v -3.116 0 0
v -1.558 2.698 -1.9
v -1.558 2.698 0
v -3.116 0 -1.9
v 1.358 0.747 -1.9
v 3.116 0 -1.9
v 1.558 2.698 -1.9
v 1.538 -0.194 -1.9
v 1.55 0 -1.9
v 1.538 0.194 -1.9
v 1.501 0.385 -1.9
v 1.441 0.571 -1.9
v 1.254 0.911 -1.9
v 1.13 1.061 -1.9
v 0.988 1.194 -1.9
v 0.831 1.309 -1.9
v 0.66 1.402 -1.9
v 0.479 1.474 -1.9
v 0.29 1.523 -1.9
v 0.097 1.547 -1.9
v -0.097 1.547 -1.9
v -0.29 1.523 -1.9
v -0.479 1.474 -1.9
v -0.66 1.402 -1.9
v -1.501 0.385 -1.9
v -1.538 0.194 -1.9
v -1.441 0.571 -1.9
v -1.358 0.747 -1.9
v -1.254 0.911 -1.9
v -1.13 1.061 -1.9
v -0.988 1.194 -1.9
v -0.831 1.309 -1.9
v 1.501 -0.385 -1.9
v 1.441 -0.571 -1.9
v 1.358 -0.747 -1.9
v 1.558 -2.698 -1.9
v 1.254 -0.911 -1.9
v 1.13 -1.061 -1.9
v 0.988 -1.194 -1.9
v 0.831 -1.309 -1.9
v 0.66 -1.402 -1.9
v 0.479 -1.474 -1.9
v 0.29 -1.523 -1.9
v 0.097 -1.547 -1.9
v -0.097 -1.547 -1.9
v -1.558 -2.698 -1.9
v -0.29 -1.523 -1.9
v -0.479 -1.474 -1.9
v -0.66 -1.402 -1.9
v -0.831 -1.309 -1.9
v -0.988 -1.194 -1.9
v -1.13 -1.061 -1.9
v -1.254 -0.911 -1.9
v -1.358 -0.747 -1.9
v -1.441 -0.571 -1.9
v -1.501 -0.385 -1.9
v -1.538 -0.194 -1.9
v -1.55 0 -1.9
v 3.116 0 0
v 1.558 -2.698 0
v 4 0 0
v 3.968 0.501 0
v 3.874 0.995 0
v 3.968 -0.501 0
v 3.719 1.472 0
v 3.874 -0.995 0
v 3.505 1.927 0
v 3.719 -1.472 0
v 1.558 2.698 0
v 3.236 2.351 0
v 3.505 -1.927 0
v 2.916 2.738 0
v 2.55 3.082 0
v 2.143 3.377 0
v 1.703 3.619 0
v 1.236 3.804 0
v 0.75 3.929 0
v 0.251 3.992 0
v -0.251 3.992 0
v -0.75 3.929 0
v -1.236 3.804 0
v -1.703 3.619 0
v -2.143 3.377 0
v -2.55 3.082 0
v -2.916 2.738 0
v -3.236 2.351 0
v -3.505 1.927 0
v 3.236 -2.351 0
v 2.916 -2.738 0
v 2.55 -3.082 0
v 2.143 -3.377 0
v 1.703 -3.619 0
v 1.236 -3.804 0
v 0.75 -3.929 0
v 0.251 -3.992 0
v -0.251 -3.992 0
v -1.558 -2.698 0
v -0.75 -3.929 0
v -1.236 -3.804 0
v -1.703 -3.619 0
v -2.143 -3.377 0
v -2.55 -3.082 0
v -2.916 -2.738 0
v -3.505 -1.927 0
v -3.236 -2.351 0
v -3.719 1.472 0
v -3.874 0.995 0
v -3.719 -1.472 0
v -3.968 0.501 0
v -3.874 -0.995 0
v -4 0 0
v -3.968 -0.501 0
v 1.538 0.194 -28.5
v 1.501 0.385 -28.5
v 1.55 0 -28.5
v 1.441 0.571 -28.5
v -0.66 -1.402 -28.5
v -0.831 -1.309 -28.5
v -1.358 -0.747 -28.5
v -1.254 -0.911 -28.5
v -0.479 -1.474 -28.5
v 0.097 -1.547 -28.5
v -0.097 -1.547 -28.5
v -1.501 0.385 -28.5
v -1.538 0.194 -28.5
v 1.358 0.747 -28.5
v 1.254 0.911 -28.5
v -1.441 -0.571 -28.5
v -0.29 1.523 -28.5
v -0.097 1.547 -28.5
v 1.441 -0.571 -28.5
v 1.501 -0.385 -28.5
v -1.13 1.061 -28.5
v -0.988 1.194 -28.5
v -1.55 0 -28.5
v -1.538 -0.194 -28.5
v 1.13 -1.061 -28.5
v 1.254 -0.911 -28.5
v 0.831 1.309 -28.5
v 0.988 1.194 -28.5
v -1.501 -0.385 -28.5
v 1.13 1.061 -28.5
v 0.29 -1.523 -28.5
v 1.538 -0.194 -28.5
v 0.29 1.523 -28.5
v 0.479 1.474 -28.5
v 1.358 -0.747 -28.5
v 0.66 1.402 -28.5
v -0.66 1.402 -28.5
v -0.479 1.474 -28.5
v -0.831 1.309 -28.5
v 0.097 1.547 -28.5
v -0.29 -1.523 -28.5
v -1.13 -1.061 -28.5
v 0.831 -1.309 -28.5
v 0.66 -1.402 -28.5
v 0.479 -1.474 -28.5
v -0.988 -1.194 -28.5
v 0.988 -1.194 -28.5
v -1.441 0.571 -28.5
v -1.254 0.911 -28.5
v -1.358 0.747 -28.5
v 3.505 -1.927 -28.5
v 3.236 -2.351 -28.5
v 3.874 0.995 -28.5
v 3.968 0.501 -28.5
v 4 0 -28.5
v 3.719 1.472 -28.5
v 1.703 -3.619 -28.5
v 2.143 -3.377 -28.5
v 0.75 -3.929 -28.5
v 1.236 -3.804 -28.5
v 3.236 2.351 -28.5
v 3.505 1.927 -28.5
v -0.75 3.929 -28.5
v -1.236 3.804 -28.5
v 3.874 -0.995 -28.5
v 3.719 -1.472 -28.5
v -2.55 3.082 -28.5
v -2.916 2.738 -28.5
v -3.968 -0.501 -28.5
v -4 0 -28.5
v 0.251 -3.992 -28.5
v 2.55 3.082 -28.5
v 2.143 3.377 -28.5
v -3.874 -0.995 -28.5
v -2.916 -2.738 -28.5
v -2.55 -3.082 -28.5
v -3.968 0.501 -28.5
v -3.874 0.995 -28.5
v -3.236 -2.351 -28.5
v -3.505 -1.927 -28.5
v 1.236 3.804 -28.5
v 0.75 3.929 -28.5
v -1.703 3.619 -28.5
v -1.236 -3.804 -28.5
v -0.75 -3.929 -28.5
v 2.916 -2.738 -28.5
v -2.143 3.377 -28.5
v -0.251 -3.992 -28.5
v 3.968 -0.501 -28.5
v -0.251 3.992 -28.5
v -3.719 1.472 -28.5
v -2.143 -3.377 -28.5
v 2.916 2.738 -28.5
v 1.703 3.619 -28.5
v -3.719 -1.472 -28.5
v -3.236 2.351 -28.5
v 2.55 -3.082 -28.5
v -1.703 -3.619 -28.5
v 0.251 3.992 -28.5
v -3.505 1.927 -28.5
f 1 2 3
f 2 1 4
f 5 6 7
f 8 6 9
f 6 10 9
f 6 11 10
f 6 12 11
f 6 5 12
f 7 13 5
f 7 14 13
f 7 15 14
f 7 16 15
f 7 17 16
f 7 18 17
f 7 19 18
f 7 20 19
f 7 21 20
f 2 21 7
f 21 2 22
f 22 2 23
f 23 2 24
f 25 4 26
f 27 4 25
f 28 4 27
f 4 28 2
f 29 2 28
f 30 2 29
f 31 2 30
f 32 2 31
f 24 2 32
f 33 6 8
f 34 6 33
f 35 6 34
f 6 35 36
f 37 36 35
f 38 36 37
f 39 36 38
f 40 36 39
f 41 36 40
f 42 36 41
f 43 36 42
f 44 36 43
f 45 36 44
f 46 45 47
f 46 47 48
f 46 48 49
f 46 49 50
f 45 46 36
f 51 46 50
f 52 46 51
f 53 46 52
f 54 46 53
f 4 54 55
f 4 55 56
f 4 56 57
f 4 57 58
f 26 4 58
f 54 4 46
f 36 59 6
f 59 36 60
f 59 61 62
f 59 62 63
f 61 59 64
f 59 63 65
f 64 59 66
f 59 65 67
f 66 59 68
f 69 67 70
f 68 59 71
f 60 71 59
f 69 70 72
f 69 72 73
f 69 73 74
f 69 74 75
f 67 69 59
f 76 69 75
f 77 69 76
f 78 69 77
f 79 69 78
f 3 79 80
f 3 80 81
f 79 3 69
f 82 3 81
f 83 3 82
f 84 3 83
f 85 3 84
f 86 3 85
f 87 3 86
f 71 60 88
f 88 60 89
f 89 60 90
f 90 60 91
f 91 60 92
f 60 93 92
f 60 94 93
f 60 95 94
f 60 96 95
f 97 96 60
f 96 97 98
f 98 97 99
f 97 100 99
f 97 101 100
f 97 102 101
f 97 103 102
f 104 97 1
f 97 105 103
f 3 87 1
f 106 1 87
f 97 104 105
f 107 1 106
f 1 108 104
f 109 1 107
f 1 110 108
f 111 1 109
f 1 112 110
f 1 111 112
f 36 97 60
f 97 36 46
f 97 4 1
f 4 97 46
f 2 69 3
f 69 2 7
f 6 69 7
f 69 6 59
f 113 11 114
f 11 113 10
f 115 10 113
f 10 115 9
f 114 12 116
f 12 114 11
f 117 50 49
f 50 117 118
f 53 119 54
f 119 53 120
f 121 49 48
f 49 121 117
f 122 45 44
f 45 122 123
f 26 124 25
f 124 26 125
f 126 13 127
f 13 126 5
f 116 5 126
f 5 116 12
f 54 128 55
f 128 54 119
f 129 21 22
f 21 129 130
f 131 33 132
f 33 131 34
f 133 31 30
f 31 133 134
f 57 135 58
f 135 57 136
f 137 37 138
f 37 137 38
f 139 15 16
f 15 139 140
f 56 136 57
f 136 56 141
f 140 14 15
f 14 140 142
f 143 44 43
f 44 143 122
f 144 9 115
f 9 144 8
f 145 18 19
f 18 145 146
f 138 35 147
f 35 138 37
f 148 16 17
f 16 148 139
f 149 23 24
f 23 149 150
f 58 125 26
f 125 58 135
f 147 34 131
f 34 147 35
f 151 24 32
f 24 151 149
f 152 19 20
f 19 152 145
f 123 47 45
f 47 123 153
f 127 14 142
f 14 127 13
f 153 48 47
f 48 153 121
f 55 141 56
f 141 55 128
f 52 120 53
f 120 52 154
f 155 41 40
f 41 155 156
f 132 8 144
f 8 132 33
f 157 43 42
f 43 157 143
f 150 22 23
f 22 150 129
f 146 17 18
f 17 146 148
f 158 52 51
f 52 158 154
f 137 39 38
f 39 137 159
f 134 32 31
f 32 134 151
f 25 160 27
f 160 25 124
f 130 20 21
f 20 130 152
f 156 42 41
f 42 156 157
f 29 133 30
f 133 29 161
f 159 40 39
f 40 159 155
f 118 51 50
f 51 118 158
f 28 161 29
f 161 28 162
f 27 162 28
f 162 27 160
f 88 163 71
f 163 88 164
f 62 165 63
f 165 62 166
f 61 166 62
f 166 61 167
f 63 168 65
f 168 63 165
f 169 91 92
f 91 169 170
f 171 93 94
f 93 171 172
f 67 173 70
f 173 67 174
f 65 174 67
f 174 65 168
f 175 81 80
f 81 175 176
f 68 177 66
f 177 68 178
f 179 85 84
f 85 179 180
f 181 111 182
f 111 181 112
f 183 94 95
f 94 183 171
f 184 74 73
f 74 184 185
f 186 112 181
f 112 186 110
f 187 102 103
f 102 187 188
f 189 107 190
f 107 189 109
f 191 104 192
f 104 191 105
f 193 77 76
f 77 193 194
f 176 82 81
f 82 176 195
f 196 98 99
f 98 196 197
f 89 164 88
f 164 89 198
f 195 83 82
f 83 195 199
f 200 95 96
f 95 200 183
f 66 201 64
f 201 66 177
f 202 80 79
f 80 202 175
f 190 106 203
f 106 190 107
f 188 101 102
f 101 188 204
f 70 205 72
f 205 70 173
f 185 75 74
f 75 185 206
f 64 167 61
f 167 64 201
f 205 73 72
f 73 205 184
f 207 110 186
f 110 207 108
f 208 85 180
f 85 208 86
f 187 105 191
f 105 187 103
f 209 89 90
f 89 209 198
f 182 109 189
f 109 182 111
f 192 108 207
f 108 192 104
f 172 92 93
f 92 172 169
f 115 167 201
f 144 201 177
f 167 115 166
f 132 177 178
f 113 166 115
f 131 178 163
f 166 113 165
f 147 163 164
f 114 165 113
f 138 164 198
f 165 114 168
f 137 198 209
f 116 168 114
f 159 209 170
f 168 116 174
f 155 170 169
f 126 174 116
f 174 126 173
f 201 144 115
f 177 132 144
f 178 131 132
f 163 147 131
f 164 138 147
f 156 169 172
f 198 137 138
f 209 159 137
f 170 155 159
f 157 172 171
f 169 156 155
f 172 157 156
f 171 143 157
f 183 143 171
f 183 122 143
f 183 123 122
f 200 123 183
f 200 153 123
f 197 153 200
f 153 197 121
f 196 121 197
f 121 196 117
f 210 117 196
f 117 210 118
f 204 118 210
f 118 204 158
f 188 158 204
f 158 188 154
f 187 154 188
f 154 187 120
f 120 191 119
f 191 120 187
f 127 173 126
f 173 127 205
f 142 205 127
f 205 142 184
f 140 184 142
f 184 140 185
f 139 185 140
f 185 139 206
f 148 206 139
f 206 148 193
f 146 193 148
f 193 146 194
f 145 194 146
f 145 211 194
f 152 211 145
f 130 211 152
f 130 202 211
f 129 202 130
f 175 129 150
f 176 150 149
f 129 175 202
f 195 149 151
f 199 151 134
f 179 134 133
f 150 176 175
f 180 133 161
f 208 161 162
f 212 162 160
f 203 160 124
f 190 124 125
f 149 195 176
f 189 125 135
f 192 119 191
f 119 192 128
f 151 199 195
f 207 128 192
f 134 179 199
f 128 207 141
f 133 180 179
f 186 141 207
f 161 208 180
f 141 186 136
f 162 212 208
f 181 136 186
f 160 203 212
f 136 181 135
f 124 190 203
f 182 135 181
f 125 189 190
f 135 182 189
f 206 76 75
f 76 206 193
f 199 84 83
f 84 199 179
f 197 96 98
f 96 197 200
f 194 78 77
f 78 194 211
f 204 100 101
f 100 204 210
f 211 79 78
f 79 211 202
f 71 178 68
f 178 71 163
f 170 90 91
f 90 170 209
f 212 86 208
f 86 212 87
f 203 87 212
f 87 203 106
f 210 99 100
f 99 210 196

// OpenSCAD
$fn = 50;

difference() {
	union() {
		translate(v = [0, 0, -28.5]) {
			cylinder(h = 31.5, r = 4.0);
		}
	}
	union() {
		translate(v = [0, 0, 0]) {
			rotate(a = [0, 0, 0]) {
				difference() {
					union() {
						translate(v = [0, 0, -1.9]) {
							linear_extrude(height = 1.9) {
								polygon(points = [[3.1158, 0.0], [1.5579000000000005, 2.698361953111554], [-1.5578999999999994, 2.6983619531115544], [-3.1158, 3.815754496783323e-16], [-1.5579000000000014, -2.6983619531115535], [1.557899999999998, -2.6983619531115552]]);
							}
						}
					}
					union();
				}
			}
		}
		#cylinder(h = 3, r = 5.0);
		#translate(v = [0, 0, -100.0]) {
			cylinder(h = 200, r = 1.55);
		}
	}
}
